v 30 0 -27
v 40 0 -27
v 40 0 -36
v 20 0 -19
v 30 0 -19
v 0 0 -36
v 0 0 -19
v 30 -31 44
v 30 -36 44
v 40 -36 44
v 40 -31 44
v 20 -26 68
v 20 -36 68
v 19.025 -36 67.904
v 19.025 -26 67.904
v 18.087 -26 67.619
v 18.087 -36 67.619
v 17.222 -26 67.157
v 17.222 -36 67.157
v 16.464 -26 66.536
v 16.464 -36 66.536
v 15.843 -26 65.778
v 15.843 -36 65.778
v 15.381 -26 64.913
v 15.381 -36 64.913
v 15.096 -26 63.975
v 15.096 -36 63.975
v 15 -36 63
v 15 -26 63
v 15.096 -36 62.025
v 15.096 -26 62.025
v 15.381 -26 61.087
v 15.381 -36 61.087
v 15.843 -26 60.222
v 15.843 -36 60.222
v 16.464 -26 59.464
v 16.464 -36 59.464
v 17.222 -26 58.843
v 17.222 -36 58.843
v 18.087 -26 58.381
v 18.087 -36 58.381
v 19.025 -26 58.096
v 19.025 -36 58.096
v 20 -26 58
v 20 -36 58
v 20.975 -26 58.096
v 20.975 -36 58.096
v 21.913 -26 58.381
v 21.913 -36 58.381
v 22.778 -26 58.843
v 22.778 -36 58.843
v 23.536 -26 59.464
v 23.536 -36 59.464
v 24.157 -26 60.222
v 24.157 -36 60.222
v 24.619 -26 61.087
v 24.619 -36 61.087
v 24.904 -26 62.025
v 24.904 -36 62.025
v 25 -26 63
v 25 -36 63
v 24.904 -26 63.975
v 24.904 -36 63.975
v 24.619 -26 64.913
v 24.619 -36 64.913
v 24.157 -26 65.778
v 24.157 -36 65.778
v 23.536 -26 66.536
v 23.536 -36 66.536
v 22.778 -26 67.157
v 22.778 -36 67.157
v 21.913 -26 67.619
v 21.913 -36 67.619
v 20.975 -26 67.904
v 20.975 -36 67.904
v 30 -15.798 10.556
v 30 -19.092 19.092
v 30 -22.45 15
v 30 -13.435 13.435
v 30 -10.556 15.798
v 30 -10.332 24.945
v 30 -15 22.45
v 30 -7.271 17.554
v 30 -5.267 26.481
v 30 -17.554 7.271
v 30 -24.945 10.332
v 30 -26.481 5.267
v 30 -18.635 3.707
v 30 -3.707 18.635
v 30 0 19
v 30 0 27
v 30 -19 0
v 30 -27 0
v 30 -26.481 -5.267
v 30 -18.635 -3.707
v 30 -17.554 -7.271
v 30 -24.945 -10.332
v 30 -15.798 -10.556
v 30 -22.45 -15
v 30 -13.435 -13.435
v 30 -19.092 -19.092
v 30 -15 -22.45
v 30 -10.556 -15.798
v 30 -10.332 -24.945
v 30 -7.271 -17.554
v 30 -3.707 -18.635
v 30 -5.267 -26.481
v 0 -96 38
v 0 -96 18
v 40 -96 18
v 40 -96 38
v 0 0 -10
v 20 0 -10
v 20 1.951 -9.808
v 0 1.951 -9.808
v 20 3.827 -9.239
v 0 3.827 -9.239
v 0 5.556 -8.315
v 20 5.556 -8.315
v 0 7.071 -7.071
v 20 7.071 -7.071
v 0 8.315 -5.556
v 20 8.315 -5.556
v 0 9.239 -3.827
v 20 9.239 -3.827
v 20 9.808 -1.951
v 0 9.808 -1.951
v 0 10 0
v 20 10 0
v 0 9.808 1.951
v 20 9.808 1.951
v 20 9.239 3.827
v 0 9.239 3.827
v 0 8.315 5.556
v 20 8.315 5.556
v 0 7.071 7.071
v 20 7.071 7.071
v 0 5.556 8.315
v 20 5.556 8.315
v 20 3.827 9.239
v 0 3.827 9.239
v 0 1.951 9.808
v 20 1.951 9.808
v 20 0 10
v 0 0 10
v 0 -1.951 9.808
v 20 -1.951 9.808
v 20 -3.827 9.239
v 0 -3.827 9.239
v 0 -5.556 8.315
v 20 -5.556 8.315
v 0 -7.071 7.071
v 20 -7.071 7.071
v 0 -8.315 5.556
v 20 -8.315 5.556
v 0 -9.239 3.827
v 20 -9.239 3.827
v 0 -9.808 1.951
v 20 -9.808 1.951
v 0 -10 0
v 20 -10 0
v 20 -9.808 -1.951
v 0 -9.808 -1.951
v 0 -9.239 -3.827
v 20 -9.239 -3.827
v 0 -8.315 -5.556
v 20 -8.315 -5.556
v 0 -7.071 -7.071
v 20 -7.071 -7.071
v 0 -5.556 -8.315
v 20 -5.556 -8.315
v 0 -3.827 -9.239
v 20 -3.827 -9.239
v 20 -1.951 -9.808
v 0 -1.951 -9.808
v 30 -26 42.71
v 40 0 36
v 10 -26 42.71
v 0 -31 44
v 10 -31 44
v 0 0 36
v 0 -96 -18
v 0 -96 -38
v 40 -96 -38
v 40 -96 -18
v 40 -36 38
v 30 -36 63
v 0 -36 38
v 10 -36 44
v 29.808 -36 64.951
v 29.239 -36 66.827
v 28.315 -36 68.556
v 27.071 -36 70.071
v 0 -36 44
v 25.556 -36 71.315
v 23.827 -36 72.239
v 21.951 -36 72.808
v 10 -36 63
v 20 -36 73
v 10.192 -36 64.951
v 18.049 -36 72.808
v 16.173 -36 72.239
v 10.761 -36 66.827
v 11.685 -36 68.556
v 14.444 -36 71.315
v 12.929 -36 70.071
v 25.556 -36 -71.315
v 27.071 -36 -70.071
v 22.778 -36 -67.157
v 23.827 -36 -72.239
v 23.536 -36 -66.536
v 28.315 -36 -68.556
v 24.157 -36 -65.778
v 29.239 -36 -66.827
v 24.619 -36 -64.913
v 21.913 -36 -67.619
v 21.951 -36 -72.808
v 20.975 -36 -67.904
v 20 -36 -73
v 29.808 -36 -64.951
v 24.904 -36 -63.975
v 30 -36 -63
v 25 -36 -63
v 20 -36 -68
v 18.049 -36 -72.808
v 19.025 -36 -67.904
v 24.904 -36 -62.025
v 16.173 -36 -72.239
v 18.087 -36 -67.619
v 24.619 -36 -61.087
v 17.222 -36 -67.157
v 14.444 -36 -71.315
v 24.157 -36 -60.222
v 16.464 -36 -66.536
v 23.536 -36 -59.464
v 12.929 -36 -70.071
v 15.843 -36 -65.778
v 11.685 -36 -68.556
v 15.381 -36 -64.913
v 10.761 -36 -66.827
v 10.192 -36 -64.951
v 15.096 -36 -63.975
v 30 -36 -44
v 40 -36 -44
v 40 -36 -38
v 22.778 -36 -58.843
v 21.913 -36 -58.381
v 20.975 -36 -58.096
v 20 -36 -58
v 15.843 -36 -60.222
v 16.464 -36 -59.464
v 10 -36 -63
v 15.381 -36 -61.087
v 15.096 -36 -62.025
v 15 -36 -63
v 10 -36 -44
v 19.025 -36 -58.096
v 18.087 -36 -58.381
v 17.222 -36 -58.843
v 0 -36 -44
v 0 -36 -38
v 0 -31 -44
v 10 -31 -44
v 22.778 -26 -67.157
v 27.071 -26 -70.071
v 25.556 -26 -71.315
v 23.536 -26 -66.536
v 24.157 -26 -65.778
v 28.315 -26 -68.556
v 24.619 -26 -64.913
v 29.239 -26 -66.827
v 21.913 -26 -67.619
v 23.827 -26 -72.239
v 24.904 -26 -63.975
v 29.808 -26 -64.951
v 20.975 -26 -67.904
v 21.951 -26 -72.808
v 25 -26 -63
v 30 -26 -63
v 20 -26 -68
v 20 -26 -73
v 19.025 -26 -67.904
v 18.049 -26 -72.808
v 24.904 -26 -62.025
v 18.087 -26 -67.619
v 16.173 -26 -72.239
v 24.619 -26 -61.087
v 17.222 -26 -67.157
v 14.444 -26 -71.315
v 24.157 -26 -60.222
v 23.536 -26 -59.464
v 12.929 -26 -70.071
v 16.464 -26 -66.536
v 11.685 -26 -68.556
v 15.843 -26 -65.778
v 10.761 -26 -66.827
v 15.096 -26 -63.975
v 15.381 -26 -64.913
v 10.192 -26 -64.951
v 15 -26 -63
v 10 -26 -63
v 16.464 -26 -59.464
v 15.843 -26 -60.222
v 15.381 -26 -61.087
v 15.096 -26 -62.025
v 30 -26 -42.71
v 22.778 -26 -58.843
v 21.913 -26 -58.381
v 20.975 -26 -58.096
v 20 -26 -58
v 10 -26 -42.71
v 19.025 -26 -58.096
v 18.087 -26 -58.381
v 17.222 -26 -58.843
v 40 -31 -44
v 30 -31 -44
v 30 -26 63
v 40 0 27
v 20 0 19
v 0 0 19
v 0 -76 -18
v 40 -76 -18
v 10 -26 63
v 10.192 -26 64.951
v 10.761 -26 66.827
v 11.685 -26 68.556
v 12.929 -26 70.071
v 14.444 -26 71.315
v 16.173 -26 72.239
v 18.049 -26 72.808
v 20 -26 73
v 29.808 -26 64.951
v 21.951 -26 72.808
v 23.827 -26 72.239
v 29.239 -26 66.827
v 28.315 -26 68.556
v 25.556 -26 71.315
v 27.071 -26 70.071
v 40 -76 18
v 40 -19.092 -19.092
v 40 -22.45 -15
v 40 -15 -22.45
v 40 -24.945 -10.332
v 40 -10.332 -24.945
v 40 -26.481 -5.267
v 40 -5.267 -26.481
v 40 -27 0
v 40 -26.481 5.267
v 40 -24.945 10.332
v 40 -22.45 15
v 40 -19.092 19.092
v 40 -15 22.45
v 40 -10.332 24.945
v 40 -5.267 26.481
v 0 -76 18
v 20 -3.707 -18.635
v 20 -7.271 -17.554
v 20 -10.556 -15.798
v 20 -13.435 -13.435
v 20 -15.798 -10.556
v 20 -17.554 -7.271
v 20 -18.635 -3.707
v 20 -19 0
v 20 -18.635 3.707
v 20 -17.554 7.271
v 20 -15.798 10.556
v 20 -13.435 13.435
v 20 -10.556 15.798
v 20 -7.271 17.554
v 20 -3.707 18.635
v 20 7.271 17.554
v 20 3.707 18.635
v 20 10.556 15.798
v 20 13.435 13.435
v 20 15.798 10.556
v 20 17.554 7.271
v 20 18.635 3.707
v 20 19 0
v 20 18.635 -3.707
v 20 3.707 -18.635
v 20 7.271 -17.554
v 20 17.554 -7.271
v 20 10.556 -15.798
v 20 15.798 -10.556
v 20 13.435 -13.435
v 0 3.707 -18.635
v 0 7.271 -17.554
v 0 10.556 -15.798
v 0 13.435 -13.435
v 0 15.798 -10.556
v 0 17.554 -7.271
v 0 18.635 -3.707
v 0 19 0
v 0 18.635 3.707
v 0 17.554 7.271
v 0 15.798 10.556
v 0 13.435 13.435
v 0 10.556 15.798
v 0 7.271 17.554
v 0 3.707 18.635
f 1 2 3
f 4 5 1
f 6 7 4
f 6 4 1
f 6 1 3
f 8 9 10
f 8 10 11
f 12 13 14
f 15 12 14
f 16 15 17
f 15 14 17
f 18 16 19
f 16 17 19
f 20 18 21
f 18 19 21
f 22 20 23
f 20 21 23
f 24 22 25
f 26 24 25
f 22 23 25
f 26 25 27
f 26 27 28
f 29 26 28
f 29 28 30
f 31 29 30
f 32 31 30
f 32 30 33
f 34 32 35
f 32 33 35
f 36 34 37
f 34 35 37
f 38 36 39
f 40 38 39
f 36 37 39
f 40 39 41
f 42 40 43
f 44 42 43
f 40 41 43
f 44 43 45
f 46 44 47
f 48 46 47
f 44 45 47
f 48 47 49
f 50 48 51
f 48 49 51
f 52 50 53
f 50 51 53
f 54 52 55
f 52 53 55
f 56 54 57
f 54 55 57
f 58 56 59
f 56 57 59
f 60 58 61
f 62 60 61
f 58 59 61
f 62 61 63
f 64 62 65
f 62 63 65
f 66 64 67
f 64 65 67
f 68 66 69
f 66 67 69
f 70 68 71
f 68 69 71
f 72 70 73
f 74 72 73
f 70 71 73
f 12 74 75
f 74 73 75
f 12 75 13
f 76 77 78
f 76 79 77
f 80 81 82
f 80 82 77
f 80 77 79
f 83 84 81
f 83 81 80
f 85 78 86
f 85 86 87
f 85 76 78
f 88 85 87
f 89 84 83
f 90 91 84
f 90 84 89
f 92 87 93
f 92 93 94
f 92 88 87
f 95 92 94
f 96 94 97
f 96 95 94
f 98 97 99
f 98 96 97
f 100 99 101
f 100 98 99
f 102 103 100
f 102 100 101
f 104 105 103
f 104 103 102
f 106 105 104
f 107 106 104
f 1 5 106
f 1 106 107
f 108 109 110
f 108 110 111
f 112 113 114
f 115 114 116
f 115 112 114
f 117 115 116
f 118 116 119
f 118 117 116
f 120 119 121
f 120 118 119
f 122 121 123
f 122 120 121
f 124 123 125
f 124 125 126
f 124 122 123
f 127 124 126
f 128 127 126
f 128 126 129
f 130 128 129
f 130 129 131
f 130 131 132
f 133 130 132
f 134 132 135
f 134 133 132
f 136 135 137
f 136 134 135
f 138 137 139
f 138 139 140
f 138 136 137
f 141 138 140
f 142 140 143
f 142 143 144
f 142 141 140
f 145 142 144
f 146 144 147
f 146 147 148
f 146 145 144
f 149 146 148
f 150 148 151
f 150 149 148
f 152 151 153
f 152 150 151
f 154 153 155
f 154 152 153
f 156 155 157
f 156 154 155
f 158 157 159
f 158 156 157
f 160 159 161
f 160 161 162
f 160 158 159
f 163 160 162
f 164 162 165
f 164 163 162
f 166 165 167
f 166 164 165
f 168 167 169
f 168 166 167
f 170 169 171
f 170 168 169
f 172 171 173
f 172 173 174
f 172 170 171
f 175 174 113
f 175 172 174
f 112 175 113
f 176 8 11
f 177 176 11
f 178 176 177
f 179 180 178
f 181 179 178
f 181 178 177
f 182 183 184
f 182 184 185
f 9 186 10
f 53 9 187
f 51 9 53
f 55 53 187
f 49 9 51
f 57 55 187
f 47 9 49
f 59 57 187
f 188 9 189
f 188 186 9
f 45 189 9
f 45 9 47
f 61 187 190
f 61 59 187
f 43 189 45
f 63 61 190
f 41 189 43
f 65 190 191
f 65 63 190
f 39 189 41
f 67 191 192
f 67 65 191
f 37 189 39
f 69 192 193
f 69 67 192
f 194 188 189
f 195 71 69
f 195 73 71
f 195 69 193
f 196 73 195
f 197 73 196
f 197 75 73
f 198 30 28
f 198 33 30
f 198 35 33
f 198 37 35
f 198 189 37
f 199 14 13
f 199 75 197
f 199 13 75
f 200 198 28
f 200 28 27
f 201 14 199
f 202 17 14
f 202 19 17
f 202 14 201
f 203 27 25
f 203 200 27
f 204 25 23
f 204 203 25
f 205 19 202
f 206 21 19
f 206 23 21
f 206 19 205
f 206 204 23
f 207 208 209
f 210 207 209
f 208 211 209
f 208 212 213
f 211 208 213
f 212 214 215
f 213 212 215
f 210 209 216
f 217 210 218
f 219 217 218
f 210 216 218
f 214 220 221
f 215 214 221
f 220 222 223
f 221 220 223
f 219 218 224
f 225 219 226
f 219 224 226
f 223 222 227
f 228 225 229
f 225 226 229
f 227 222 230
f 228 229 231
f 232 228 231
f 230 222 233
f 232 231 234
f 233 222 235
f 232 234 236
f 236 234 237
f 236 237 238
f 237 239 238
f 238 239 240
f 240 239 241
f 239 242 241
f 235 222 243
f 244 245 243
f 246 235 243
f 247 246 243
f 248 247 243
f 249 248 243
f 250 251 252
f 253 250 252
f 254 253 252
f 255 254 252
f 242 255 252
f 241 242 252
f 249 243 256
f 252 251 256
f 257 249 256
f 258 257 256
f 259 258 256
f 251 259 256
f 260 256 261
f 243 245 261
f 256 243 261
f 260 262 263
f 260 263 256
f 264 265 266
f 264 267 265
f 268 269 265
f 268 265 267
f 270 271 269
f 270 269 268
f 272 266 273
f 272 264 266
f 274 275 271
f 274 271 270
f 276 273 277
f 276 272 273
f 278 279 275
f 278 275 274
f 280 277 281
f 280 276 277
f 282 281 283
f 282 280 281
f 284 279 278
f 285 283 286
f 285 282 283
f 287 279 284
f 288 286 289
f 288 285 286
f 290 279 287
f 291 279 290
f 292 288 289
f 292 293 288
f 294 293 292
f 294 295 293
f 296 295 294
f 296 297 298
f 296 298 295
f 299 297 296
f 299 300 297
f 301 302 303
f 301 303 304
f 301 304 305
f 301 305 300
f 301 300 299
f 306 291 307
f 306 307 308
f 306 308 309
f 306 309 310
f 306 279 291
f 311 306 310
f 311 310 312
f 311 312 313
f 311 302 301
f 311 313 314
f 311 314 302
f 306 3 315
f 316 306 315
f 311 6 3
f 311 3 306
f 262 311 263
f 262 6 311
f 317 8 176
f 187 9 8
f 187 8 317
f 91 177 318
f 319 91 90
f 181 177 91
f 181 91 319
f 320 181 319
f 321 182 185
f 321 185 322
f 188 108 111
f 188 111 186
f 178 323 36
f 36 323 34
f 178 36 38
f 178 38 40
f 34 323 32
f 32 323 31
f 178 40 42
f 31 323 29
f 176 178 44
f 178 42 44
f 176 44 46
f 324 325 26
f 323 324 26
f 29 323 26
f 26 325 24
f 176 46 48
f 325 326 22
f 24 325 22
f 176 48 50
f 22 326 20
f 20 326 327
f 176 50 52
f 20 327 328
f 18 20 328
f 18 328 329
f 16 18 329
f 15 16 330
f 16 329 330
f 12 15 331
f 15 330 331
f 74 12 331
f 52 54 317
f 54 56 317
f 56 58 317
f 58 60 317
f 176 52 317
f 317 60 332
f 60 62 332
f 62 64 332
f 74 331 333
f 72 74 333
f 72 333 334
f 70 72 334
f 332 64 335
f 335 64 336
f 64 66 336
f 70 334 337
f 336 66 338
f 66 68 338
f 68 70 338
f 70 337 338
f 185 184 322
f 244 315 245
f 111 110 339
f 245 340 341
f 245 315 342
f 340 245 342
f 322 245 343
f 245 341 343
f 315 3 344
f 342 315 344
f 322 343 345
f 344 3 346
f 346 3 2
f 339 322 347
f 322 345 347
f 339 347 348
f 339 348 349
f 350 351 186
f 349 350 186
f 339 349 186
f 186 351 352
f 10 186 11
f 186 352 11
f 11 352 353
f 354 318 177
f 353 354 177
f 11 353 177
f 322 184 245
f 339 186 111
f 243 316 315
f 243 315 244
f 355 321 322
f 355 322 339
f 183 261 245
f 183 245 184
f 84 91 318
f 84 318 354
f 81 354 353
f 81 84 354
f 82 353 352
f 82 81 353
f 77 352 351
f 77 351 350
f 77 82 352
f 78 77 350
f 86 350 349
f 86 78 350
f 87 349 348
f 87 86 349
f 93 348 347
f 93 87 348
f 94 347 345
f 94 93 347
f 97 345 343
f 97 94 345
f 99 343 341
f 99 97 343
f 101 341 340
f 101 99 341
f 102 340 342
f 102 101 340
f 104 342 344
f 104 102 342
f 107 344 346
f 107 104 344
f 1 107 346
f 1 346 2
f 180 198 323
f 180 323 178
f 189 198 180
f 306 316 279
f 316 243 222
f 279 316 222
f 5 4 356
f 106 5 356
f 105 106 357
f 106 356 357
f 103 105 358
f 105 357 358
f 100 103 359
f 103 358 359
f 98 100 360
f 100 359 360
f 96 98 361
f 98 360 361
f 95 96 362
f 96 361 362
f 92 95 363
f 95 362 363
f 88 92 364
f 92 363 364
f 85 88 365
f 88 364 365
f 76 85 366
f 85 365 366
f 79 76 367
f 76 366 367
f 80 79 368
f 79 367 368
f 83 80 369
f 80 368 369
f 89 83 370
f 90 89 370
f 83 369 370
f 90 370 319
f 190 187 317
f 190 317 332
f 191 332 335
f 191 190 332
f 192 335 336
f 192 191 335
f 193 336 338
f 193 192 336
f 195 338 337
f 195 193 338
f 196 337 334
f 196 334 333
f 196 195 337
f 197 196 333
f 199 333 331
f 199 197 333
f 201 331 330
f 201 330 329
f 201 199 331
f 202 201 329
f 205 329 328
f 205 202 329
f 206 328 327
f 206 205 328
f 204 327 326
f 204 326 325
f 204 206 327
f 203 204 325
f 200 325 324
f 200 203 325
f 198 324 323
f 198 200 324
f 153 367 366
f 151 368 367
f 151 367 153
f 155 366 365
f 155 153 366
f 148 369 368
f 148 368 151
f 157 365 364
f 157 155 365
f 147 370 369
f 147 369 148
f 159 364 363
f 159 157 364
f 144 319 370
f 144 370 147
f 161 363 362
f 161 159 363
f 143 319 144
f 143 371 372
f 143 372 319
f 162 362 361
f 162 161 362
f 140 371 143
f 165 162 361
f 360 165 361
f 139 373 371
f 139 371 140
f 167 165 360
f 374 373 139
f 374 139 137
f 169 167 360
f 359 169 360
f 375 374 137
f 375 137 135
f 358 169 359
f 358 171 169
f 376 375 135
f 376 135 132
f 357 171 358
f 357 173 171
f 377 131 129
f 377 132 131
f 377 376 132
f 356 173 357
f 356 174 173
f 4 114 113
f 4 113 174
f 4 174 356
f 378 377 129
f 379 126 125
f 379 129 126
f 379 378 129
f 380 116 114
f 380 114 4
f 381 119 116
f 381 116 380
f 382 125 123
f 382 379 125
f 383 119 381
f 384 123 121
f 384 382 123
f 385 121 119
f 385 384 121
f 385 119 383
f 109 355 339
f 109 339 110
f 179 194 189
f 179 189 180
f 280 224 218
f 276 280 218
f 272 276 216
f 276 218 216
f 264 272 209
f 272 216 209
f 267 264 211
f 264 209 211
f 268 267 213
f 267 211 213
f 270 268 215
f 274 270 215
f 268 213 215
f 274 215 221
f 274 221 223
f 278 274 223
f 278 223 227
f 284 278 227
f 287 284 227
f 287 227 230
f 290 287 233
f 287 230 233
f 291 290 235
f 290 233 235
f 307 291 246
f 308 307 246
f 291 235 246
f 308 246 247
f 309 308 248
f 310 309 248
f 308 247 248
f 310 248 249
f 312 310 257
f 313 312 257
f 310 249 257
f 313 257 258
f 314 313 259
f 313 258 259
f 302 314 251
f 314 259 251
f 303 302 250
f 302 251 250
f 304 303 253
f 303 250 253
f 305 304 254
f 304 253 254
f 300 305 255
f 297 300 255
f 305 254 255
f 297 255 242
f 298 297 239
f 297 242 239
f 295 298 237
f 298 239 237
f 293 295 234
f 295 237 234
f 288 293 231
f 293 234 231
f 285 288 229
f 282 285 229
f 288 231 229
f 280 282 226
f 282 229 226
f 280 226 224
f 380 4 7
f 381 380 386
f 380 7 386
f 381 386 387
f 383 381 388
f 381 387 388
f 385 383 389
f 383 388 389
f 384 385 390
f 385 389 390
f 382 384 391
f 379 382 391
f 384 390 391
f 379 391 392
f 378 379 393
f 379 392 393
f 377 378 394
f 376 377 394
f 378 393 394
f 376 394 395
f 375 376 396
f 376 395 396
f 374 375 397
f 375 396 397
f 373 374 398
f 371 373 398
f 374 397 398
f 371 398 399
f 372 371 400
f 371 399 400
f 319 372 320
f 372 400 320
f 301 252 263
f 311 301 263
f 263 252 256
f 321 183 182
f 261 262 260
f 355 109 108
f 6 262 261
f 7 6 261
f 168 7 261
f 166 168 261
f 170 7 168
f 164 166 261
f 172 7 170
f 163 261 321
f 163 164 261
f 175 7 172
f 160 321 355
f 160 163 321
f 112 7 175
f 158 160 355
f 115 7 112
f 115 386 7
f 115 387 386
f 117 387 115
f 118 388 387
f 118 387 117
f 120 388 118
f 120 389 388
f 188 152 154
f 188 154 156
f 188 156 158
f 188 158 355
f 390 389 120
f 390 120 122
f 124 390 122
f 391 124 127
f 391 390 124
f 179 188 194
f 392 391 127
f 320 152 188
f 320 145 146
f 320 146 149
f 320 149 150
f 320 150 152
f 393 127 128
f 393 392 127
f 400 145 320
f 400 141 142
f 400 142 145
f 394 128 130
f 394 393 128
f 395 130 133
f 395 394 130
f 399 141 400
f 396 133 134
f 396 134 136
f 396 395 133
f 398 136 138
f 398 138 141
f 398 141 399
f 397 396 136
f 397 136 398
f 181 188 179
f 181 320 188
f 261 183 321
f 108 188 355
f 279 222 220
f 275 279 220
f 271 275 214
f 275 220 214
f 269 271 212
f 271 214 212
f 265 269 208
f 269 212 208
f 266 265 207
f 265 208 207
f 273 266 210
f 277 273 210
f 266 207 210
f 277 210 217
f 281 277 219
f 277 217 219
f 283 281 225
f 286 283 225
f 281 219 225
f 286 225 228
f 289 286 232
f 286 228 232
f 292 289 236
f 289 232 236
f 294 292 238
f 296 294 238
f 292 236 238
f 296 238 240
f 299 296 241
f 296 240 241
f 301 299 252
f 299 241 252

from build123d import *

# Parameters (mm, degrees)
SKETCH1_R           = 10
BOSS_EXTRUDE1_DEPTH = 20
BOSS_EXTRUDE2_DEPTH = 30
BOSS_EXTRUDE3_DEPTH = 40
SKETCH2_R           = 5
BOSS_EXTRUDE4_DEPTH = 10


with BuildPart() as part:
    # Sketch1 → Boss-Extrude1 (new body)
    with BuildSketch(Plane(origin=(0, 0, 0), x_dir=(0, 0, -1), z_dir=(1, 0, 0))):
        with BuildLine():
            ThreePointArc((-19, 0), (0, -19), (19, 0))
            ThreePointArc((19, 0), (0, 19), (-19, 0))
        make_face()
        Circle(SKETCH1_R, mode=Mode.SUBTRACT)
    extrude(amount=BOSS_EXTRUDE1_DEPTH)

    # Sketch1<3> → Boss-Extrude2 (add)
    with BuildSketch(Plane(origin=(0, 0, 0), x_dir=(0, 0, -1), z_dir=(1, 0, 0))):
        with BuildLine():
            ThreePointArc((-27, 0), (0, -27), (27, 0))
            Line((27, 0), (19, 0))
            ThreePointArc((19, 0), (0, -19), (-19, 0))
            Line((-19, 0), (-27, 0))
        make_face()
    extrude(amount=BOSS_EXTRUDE2_DEPTH)

    # Sketch1<4> → Boss-Extrude3 (add)
    with BuildSketch(Plane(origin=(0, 0, 0), x_dir=(0, 0, -1), z_dir=(1, 0, 0))):
        with BuildLine():
            Line((36, 0), (27, 0))
            ThreePointArc((27, 0), (0, -27), (-27, 0))
            Line((-27, 0), (-36, 0))
            Line((-36, 0), (-44, -31))
            Line((-44, -31), (-44, -36))
            Line((-44, -36), (-38, -36))
            Line((-38, -36), (-38, -96))
            Line((-38, -96), (-18, -96))
            Line((-18, -96), (-18, -76))
            Line((-18, -76), (18, -76))
            Line((18, -76), (18, -96))
            Line((18, -96), (38, -96))
            Line((38, -96), (38, -36))
            Line((38, -36), (44, -36))
            Line((44, -36), (44, -31))
            Line((44, -31), (36, 0))
        make_face()
    extrude(amount=BOSS_EXTRUDE3_DEPTH)

    # Sketch2 → Boss-Extrude4 (add)
    # profile 1 of 2: a face of its own
    with BuildSketch(Plane.XZ.offset(36)):
        with BuildLine():
            Line((10, -63), (10, -42))
            Line((10, -42), (30, -42))
            Line((30, -42), (30, -63))
            ThreePointArc((30, -63), (20, -73), (10, -63))
        make_face()
        with Locations((20, -63)):
            Circle(SKETCH2_R, mode=Mode.SUBTRACT)
    # profile 2 of 2: a face of its own
    with BuildSketch(Plane.XZ.offset(36)):
        with BuildLine():
            Line((30, 42), (30, 63))
            ThreePointArc((30, 63), (20, 73), (10, 63))
            Line((10, 63), (10, 42))
            Line((10, 42), (30, 42))
        make_face()
        with Locations((20, 63)):
            Circle(SKETCH2_R, mode=Mode.SUBTRACT)
    extrude(amount=-BOSS_EXTRUDE4_DEPTH)


solid = part.part
